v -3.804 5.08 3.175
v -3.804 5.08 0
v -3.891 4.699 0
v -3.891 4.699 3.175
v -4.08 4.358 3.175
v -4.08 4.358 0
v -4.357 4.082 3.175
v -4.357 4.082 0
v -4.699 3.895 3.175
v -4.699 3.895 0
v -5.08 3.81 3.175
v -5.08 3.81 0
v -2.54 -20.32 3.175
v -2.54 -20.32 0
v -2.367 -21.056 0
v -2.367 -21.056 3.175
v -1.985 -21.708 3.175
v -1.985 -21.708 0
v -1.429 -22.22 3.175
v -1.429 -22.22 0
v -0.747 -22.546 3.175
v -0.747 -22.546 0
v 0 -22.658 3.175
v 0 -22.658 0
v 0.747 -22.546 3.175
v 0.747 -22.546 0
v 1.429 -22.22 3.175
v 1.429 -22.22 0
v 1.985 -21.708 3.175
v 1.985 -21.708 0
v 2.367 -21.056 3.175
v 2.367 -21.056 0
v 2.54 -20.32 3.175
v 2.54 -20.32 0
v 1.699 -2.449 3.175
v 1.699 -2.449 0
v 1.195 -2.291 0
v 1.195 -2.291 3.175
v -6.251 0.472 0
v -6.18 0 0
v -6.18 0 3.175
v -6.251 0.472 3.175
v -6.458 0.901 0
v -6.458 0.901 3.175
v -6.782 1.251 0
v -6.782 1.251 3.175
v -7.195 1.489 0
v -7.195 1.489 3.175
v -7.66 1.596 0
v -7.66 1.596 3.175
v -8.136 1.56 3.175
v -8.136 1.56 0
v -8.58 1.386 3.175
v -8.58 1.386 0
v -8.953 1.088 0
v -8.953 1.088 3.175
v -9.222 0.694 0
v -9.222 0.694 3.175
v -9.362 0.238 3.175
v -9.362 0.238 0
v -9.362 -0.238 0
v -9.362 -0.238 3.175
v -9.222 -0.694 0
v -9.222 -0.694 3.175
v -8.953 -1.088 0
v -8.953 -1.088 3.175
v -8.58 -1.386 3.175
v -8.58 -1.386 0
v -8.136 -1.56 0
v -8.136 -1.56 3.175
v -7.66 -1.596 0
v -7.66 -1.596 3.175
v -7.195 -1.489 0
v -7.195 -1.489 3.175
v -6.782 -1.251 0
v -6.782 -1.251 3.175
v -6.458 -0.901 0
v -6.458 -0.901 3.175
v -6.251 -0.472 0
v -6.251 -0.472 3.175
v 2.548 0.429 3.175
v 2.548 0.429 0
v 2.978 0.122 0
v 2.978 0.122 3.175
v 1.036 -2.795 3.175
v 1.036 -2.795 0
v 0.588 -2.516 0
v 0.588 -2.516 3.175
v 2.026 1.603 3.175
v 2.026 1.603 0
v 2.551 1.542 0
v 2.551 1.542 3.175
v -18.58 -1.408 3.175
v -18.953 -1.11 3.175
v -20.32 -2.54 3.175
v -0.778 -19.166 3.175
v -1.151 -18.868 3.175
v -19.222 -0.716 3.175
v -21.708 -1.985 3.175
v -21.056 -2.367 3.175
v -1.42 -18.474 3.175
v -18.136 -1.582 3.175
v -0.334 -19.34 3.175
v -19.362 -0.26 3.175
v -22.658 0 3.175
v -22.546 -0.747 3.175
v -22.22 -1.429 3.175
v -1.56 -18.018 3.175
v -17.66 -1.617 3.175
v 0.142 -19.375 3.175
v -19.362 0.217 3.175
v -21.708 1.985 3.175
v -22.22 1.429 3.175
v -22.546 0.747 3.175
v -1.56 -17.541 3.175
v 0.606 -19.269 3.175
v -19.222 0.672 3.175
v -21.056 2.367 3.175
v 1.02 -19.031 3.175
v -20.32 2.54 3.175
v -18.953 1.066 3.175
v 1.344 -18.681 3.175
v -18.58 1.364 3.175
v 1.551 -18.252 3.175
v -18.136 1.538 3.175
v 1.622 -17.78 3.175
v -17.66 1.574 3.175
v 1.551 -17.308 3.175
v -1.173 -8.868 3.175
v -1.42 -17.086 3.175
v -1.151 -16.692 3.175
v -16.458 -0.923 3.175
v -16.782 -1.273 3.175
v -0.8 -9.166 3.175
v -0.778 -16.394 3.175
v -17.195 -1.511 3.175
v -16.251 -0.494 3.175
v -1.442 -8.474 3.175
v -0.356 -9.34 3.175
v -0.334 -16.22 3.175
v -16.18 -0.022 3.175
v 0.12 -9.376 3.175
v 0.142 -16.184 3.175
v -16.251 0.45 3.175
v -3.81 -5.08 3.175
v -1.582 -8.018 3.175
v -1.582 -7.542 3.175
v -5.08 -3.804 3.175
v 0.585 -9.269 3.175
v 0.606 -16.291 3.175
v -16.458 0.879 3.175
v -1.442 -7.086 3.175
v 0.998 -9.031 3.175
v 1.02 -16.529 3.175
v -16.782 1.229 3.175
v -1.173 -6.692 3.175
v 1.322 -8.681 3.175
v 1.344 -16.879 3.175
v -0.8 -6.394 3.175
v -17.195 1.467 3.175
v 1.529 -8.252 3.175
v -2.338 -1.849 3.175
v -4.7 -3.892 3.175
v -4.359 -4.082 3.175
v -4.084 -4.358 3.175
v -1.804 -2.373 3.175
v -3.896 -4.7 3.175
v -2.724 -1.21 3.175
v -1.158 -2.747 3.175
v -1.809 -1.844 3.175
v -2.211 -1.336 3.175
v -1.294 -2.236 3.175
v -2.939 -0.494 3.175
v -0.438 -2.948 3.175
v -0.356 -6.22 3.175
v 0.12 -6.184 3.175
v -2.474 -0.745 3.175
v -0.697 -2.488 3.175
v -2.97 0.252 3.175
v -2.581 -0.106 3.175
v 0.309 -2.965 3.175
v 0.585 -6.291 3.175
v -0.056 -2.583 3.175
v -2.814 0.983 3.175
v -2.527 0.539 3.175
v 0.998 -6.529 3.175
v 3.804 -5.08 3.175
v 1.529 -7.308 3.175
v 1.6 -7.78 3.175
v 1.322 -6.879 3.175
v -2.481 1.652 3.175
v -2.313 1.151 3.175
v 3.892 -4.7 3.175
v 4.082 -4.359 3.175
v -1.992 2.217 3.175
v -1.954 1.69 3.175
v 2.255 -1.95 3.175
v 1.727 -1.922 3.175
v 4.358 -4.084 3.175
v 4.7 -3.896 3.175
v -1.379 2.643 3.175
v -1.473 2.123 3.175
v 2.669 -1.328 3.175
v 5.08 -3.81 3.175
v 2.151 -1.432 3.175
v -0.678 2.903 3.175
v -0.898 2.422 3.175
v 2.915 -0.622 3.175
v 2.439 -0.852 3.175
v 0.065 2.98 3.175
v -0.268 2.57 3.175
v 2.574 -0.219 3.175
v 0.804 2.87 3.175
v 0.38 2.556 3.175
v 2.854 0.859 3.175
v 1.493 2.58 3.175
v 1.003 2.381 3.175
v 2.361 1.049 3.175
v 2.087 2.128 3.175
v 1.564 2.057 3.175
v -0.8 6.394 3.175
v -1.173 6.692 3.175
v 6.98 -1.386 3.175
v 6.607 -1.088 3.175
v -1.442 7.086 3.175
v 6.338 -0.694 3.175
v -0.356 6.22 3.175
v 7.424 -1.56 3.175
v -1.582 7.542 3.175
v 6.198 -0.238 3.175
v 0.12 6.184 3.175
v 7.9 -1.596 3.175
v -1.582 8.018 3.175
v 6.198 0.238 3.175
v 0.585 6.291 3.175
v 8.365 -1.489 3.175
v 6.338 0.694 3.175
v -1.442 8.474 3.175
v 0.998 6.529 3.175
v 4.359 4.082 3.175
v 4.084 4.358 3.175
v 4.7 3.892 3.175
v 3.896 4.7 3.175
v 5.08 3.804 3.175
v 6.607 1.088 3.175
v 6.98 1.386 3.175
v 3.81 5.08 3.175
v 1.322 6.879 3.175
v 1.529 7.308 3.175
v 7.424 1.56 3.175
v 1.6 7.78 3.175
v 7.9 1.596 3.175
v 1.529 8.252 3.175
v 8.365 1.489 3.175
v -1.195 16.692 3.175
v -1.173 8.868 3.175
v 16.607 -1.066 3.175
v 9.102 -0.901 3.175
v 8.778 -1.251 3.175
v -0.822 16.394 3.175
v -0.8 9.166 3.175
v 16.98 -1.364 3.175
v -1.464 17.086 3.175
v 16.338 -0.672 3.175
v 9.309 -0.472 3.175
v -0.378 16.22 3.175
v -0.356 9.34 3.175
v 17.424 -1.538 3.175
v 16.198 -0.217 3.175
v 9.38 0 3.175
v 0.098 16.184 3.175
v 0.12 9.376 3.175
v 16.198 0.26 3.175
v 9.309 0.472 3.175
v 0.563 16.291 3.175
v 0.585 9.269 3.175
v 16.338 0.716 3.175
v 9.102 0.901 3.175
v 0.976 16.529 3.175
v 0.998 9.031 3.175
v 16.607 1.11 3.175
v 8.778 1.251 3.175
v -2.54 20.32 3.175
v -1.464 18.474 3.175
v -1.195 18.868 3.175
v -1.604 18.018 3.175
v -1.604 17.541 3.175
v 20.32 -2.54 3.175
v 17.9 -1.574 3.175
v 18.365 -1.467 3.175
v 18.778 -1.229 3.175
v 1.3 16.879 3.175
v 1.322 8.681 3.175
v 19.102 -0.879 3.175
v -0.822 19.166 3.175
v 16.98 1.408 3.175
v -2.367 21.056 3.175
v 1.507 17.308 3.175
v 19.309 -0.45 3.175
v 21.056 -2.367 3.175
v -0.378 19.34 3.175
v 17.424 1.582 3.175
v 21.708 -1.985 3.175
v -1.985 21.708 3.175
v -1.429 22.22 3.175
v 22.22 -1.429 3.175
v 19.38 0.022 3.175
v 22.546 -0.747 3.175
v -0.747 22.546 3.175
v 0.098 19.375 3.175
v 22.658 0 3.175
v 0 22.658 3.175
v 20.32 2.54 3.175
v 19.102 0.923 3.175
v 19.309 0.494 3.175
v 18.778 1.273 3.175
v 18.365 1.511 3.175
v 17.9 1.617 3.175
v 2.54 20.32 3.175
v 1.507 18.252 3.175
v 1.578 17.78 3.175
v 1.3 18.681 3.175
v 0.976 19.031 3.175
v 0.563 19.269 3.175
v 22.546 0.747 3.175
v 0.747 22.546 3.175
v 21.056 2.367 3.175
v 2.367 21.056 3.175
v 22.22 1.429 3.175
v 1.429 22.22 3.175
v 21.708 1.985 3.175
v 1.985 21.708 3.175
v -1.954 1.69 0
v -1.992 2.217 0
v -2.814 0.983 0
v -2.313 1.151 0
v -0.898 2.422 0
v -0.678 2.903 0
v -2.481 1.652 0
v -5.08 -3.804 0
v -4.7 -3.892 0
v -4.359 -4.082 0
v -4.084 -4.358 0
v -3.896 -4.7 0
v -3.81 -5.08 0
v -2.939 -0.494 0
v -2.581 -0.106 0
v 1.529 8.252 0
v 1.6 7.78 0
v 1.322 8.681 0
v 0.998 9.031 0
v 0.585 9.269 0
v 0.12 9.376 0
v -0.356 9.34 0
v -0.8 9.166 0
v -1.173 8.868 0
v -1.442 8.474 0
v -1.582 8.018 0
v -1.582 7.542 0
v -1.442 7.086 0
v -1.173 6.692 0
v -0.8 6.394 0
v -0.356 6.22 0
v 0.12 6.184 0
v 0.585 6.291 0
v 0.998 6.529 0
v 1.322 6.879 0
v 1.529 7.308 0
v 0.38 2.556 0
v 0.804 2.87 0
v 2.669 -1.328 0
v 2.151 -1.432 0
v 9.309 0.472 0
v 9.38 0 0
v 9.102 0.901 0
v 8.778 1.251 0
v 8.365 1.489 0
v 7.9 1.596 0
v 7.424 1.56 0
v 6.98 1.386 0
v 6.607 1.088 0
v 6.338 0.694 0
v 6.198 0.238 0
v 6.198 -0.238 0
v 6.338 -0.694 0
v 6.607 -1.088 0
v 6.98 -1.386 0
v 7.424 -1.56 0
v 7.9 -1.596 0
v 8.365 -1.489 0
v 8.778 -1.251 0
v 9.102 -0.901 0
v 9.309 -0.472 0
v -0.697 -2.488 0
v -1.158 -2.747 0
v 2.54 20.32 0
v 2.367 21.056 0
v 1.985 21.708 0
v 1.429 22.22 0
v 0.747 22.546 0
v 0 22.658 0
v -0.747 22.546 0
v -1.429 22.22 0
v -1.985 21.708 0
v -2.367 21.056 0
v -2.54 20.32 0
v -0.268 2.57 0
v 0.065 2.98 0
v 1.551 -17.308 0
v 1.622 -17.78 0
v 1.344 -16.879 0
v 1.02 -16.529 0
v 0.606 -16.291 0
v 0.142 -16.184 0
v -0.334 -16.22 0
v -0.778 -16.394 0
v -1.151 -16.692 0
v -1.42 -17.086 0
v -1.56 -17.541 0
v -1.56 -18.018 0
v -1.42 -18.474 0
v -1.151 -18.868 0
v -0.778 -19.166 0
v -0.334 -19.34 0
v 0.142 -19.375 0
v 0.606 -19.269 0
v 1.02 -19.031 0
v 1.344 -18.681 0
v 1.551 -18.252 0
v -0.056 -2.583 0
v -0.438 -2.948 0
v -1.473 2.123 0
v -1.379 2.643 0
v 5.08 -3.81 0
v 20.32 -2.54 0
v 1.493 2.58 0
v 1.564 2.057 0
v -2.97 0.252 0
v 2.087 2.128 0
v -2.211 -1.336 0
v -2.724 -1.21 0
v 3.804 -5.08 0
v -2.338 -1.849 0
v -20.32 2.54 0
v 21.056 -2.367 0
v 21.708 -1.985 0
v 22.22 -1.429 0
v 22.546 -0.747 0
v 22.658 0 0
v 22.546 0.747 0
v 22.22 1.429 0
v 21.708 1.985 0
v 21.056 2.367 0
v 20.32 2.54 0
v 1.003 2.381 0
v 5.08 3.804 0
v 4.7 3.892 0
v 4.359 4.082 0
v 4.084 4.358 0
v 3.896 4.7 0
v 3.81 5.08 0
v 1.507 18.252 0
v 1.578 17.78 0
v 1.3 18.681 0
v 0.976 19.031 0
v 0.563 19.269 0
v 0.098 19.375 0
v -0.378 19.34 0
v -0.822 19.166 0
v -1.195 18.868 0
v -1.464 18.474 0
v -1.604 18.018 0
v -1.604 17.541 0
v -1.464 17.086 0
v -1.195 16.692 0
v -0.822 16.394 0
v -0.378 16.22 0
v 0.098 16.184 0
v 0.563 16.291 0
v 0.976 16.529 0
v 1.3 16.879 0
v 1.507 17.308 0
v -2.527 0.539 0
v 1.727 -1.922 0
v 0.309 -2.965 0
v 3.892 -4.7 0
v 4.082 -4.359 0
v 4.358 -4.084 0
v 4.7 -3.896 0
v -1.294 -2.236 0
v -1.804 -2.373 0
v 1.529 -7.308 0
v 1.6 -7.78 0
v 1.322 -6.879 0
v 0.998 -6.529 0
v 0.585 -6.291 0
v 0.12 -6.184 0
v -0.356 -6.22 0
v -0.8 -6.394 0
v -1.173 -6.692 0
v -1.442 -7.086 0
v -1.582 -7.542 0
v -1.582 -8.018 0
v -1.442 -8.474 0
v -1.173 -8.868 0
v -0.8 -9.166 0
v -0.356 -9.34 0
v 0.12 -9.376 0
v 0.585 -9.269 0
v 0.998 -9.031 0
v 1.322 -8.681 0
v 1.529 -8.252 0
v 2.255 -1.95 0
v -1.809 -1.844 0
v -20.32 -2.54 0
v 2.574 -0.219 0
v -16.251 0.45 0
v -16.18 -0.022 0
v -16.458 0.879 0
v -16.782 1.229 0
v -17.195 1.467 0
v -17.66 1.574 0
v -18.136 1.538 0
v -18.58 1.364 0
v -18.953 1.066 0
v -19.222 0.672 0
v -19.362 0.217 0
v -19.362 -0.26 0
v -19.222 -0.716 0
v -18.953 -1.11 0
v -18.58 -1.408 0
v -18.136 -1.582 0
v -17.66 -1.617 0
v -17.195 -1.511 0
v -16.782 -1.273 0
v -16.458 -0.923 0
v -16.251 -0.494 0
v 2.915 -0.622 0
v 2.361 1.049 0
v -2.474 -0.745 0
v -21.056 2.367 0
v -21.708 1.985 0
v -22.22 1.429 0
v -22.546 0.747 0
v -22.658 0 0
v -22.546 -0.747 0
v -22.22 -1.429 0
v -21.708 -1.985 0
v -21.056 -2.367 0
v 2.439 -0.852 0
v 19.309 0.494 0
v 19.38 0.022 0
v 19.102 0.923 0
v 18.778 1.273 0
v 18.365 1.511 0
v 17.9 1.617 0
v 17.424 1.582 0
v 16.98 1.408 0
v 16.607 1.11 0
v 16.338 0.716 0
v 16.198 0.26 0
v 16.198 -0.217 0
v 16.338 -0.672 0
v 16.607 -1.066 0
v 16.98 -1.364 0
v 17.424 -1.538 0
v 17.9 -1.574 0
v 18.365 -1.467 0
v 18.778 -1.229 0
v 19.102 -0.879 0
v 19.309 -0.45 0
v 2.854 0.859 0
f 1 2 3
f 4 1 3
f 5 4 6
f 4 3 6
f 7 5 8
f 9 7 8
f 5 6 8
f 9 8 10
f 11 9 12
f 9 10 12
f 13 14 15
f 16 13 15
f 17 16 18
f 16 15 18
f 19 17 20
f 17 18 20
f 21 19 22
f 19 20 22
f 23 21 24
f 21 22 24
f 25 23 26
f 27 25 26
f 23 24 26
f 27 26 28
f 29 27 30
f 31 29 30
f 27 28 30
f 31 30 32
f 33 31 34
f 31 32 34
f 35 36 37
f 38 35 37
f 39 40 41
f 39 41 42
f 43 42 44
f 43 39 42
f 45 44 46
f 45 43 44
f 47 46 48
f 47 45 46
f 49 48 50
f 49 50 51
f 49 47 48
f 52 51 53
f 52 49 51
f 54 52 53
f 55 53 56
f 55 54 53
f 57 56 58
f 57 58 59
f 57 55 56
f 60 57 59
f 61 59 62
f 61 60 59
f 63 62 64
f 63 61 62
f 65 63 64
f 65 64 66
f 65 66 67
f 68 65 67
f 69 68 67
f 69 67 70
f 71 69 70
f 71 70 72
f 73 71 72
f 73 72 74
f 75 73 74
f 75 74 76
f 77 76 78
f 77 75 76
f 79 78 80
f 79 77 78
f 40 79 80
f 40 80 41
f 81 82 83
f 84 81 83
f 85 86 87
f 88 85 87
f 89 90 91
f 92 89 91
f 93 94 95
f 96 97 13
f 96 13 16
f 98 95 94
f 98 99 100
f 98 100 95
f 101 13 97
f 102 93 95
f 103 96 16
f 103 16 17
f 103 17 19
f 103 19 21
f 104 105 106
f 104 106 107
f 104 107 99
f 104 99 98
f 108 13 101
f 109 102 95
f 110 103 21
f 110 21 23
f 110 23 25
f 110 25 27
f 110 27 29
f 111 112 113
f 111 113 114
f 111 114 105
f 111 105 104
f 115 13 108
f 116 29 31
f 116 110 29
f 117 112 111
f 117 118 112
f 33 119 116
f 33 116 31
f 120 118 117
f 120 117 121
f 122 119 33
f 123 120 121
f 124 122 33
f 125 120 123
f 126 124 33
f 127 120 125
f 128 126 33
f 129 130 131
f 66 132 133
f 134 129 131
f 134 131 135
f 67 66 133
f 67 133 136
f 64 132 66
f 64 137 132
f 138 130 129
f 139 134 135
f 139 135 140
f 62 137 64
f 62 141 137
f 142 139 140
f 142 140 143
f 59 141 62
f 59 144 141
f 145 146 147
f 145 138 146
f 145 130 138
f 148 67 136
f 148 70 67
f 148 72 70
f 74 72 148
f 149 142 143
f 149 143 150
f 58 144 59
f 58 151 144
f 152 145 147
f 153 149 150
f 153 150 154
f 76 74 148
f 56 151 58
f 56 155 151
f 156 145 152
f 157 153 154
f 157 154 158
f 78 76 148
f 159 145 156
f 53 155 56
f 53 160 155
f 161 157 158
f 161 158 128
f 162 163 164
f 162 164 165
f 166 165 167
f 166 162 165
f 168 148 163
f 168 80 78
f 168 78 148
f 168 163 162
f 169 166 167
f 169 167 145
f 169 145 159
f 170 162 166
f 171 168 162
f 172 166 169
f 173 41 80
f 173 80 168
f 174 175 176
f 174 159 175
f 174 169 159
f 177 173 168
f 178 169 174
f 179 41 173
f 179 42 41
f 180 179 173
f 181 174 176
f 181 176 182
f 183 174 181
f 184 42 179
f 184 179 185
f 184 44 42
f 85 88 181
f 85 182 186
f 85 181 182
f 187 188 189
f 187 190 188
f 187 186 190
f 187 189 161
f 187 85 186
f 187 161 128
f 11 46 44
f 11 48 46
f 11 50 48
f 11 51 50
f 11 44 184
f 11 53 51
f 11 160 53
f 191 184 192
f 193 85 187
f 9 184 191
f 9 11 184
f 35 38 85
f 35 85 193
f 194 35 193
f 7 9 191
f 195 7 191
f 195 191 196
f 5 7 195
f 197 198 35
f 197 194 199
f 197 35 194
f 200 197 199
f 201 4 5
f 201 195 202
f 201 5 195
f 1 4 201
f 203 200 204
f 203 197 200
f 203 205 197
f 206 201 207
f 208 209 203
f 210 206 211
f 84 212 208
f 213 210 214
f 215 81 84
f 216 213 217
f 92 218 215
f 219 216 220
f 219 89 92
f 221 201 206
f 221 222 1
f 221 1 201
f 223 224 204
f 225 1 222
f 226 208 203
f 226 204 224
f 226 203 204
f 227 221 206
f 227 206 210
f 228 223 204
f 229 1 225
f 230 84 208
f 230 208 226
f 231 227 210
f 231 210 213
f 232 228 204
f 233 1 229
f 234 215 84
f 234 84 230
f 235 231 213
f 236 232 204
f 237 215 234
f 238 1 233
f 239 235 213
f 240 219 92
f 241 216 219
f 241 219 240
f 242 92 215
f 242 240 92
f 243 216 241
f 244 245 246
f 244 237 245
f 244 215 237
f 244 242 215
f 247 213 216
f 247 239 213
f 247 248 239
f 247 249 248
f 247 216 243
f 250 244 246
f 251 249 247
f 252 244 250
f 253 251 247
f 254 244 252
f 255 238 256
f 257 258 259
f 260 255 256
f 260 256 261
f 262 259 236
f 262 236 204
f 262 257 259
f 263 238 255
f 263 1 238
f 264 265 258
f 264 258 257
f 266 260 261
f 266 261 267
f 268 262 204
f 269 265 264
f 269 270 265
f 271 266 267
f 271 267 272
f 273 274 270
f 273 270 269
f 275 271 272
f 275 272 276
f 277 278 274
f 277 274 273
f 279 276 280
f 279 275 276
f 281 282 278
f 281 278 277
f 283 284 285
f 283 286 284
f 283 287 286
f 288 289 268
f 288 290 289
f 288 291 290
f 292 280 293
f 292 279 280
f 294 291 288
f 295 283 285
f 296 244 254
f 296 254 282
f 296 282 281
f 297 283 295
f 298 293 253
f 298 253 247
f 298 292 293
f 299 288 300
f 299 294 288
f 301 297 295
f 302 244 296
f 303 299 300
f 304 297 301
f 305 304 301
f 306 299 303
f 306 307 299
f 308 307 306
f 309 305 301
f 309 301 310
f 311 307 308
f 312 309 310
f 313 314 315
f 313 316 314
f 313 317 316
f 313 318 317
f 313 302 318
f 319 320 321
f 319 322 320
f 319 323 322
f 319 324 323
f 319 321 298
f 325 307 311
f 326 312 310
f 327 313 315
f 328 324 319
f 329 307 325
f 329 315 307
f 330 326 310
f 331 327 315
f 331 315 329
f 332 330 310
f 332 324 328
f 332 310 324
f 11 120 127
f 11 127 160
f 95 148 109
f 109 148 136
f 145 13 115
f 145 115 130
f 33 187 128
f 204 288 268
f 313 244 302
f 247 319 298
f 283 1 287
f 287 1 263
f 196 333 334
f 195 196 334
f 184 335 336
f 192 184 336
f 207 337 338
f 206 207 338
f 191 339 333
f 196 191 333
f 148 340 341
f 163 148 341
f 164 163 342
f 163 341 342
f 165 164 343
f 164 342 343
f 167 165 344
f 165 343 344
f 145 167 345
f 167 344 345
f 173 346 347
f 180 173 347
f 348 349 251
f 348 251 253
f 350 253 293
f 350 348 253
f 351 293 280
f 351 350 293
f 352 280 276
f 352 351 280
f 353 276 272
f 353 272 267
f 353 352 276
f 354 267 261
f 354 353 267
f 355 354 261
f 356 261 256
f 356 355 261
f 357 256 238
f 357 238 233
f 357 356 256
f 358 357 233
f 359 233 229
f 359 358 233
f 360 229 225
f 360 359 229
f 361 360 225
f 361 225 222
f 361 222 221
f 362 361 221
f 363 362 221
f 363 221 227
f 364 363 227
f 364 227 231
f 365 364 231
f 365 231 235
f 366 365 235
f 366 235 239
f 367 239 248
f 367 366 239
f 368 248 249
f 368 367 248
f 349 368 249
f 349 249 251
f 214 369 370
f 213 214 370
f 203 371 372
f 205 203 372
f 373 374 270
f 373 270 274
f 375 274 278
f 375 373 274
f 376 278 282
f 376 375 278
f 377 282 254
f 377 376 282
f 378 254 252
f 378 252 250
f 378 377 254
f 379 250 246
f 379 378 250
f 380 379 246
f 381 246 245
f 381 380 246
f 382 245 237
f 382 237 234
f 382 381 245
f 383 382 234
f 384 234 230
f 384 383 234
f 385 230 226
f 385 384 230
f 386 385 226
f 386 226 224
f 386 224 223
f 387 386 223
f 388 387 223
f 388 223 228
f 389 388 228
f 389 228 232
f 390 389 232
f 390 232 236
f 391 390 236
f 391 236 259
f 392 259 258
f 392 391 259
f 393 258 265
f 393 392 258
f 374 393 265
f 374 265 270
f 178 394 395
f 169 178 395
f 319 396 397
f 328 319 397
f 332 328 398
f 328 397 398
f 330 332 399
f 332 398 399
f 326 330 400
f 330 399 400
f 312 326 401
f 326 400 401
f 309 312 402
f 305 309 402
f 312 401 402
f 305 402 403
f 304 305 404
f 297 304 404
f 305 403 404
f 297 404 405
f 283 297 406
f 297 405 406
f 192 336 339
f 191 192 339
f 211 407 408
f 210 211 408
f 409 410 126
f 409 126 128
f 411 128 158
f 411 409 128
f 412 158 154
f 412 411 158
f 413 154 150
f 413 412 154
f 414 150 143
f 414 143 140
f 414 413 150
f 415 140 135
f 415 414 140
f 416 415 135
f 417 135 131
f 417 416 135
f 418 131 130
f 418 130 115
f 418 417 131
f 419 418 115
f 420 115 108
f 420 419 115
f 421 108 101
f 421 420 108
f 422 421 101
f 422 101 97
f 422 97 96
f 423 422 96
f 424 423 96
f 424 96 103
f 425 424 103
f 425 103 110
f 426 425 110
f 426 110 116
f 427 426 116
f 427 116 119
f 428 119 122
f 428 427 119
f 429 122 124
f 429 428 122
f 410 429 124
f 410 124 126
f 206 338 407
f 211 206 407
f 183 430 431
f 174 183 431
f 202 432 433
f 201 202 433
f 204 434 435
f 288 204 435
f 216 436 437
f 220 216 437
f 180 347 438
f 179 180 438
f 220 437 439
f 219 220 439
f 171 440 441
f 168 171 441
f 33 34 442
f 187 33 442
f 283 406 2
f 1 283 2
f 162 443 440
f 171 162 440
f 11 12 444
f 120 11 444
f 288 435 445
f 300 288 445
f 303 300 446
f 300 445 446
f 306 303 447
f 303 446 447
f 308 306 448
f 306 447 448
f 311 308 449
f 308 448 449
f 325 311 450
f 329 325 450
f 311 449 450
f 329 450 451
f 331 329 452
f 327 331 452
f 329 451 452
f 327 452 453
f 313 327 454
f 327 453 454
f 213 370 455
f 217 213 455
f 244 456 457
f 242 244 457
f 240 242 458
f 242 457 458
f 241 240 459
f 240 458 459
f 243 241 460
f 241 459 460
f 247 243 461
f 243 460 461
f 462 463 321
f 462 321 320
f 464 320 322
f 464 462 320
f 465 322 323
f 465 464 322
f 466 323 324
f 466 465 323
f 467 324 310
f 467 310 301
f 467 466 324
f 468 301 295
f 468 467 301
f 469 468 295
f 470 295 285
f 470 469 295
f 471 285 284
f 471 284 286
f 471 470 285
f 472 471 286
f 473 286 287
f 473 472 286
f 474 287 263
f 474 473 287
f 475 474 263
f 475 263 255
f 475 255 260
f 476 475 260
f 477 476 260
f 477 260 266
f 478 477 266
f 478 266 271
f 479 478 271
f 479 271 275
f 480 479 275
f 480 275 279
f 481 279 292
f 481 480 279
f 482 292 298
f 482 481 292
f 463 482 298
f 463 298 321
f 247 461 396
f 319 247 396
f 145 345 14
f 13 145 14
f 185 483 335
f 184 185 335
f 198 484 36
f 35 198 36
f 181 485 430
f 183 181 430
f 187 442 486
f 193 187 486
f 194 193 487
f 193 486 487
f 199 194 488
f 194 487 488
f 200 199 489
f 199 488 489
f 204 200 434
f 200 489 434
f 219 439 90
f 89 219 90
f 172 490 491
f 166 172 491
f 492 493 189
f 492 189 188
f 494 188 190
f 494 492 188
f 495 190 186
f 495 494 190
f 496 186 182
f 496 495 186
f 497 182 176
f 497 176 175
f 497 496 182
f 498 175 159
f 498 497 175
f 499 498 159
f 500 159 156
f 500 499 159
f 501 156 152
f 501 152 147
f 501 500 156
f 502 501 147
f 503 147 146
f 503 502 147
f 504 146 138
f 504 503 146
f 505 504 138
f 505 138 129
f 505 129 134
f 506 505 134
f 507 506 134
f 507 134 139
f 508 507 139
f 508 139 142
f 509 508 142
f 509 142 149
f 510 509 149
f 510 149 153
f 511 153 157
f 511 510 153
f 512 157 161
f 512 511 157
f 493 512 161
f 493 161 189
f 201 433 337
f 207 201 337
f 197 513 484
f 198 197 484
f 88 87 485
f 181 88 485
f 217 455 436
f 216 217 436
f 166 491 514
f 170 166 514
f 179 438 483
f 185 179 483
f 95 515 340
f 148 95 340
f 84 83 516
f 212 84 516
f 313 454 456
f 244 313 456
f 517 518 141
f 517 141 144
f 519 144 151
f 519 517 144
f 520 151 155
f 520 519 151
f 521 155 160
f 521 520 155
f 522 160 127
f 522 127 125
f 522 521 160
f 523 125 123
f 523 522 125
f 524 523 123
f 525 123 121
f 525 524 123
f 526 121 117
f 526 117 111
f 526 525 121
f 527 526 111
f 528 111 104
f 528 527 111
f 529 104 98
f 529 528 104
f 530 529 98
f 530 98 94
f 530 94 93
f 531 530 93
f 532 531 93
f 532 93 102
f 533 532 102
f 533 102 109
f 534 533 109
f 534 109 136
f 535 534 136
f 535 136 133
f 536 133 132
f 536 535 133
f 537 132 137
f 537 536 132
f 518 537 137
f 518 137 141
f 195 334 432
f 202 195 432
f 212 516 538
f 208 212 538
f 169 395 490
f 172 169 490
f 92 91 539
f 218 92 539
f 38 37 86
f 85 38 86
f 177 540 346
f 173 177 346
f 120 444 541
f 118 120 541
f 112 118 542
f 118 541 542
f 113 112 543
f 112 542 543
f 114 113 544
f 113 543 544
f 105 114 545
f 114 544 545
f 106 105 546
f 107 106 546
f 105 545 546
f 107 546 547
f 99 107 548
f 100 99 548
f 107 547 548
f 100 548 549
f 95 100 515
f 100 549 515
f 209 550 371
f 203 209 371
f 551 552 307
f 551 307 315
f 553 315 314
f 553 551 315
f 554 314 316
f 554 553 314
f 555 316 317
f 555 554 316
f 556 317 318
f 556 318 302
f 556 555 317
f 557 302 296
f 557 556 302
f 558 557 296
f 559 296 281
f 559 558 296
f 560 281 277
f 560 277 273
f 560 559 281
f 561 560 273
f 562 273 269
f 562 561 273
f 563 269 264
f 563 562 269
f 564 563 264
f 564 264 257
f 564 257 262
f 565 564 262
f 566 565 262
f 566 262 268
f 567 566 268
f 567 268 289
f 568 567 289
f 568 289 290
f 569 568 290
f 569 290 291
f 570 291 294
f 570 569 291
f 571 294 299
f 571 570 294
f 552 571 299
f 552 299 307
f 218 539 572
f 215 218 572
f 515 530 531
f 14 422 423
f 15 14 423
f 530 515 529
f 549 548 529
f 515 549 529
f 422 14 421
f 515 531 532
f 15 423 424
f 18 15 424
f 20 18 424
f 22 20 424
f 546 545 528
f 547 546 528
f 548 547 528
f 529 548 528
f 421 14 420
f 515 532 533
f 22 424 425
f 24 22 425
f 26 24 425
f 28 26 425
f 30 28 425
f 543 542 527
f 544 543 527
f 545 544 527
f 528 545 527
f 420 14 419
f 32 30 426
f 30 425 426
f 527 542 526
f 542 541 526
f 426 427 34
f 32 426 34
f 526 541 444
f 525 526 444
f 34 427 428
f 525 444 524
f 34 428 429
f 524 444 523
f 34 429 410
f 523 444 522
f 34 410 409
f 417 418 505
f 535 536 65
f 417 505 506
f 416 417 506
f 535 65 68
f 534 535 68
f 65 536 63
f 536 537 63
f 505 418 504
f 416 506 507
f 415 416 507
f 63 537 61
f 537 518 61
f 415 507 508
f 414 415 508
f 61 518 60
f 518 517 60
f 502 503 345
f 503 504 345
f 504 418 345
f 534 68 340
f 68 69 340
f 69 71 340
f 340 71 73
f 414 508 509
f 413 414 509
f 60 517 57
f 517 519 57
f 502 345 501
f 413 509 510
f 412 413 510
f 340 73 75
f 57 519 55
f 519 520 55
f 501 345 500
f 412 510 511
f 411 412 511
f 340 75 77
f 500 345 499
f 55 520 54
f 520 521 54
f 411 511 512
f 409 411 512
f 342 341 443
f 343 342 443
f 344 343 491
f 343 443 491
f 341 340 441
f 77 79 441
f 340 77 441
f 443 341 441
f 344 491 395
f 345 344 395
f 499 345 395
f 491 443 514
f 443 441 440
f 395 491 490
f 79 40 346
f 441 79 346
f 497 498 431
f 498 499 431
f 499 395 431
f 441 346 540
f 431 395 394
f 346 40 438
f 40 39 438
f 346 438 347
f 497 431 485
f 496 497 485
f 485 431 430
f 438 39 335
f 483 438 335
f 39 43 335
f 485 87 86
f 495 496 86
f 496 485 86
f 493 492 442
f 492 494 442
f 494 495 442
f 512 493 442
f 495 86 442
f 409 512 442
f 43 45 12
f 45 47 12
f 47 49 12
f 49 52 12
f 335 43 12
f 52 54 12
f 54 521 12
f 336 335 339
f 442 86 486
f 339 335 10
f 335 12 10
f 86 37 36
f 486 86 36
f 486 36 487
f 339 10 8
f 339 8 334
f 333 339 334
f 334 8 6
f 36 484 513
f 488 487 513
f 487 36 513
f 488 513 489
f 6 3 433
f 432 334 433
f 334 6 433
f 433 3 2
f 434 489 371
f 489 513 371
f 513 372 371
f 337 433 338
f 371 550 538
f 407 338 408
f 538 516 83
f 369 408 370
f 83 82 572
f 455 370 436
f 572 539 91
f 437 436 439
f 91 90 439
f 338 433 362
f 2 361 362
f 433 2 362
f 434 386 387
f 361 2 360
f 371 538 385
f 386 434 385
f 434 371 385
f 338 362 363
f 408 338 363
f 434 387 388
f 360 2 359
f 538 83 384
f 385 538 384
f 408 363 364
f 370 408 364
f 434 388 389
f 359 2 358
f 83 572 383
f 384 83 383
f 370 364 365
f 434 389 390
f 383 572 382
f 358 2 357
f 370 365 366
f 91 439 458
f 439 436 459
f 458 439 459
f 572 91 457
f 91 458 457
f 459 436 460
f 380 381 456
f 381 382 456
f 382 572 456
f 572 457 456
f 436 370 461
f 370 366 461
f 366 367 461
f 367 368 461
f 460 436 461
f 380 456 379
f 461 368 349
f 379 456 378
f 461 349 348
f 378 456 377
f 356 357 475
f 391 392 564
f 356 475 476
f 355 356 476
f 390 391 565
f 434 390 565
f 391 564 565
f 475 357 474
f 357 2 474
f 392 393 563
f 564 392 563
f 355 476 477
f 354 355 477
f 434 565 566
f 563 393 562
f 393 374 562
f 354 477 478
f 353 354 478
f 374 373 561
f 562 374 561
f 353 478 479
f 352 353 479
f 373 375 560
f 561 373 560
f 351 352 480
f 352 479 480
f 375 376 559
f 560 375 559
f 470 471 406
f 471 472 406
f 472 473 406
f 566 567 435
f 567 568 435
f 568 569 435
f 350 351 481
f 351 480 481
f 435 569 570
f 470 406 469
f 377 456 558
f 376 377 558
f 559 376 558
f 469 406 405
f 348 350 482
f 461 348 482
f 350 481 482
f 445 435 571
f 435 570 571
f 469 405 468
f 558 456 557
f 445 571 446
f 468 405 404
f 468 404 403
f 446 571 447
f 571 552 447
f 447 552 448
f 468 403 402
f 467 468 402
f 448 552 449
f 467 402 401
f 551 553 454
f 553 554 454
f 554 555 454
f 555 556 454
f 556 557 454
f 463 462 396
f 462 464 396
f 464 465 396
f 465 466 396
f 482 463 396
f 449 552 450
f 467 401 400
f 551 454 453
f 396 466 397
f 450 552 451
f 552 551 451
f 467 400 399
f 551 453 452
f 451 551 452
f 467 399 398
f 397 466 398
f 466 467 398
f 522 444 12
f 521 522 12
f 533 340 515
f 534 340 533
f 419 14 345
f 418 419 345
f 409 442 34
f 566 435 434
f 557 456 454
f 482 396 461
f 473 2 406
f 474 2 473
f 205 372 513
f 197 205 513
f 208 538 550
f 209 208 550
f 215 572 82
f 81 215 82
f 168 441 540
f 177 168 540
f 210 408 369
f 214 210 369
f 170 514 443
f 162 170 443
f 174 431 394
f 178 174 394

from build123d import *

# Parameters (mm, degrees)
F0_R     = 1.6
F1_DEPTH = 3.175


# Not quite as in the source:
# - a length typed as a fraction of an inch, garbled in the dataset ("3 / 203.2 mm" for 3/8 in), is restored


with BuildPart() as f1:
    # F0 (on Top) → F1 (new body)
    with BuildSketch(Plane.XY):
        with BuildLine():
            ThreePointArc((-3.8043671626, 5.08), (-4.2086486587, 4.2104292787), (-5.08, 3.81))
            Line((-5.08, 3.81), (-20.32, 2.54))
            ThreePointArc((-20.32, 2.54), (-22.6579985335, 0), (-20.32, -2.54))
            Line((-20.32, -2.54), (-5.08, -3.8043671626))
            ThreePointArc((-5.08, -3.8043671626), (-4.2121628624, -4.2103745873), (-3.81, -5.08))
            Line((-3.81, -5.08), (-2.54, -20.32))
            ThreePointArc((-2.54, -20.32), (0, -22.6579985335), (2.54, -20.32))
            Line((2.54, -20.32), (3.8043671626, -5.08))
            ThreePointArc((3.8043671626, -5.08), (4.2103745873, -4.2121628624), (5.08, -3.81))
            Line((5.08, -3.81), (20.32, -2.54))
            ThreePointArc((20.32, -2.54), (22.6579985335, 0), (20.32, 2.54))
            Line((20.32, 2.54), (5.08, 3.8043671626))
            ThreePointArc((5.08, 3.8043671626), (4.2121628624, 4.2103745873), (3.81, 5.08))
            Line((3.81, 5.08), (2.54, 20.32))
            ThreePointArc((2.54, 20.32), (0, 22.6579985335), (-2.54, 20.32))
            Line((-2.54, 20.32), (-3.8043671626, 5.08))
        make_face()
        with Locations((-17.7799620532, -0.0219527348)):
            Circle(F0_R, mode=Mode.SUBTRACT)
        with Locations((-7.7799861494, 0)):
            Circle(F0_R, mode=Mode.SUBTRACT)
        with Locations((0.0219527348, -17.7799620532)):
            Circle(F0_R, mode=Mode.SUBTRACT)
        with Locations((0, -7.7799861494)):
            Circle(F0_R, mode=Mode.SUBTRACT)
        with Locations((7.7799861494, 0)):
            Circle(F0_R, mode=Mode.SUBTRACT)
        with Locations((-0.0219527348, 17.7799620532)):
            Circle(F0_R, mode=Mode.SUBTRACT)
        Polygon((-2.3131272616, 1.150841372), (-2.4811892868, 1.651717782), (-1.9542535042, 1.6899369317), (-1.992472654, 2.2168727143), (-1.4725868119, 2.1228475389), (-1.3785616365, 2.6427333809), (-0.8983920744, 2.4223718279), (-0.6780305213, 2.90254139), (-0.2677480588, 2.5696895861), (0.0651037451, 2.9799720486), (0.379719552, 2.555544297), (0.8041473037, 2.8701601039), (1.0033279869, 2.380824761), (1.4926633298, 2.5800054442), (1.5638936344, 2.0565092492), (2.0873898293, 2.1277395538), (2.0261940932, 1.6029756981), (2.5509579489, 1.5417799619), (2.3611813253, 1.0487212884), (2.8542399989, 0.8589446648), (2.547806851, 0.4285718633), (2.9781796525, 0.1221387154), (2.574344302, -0.2185063082), (2.9149893256, -0.6223416587), (2.4391262327, -0.8518549247), (2.6686394987, -1.3277180175), (2.1506488918, -1.4316783634), (2.2546092377, -1.9496689703), (1.7270383715, -1.9215441851), (1.6989135863, -2.4491150513), (1.1949116786, -2.2906723188), (1.0364689461, -2.7946742265), (0.5877042905, -2.5158690862), (0.3088991502, -2.9646337418), (-0.0564307197, -2.5829845462), (-0.4380799154, -2.9483144161), (-0.6970199802, -2.4878015876), (-1.1575328087, -2.7467416524), (-1.2938129119, -2.2363009057), (-1.8042536586, -2.3725810089), (-1.80931082, -1.8442852134), (-2.3376066155, -1.8493423749), (-2.2111230752, -1.3363862984), (-2.7240791517, -1.209902758), (-2.4740023355, -0.7445173173), (-2.9393877762, -0.4944405012), (-2.5814309304, -0.105867575), (-2.9700038565, 0.2520892708), (-2.5266587261, 0.5394342163), (-2.8140036716, 0.9827793468), align=None, mode=Mode.SUBTRACT)
        with Locations((0, 7.7799861494)):
            Circle(F0_R, mode=Mode.SUBTRACT)
        with Locations((17.7799620532, 0.0219527348)):
            Circle(F0_R, mode=Mode.SUBTRACT)
    extrude(amount=F1_DEPTH)


solid = f1.part
